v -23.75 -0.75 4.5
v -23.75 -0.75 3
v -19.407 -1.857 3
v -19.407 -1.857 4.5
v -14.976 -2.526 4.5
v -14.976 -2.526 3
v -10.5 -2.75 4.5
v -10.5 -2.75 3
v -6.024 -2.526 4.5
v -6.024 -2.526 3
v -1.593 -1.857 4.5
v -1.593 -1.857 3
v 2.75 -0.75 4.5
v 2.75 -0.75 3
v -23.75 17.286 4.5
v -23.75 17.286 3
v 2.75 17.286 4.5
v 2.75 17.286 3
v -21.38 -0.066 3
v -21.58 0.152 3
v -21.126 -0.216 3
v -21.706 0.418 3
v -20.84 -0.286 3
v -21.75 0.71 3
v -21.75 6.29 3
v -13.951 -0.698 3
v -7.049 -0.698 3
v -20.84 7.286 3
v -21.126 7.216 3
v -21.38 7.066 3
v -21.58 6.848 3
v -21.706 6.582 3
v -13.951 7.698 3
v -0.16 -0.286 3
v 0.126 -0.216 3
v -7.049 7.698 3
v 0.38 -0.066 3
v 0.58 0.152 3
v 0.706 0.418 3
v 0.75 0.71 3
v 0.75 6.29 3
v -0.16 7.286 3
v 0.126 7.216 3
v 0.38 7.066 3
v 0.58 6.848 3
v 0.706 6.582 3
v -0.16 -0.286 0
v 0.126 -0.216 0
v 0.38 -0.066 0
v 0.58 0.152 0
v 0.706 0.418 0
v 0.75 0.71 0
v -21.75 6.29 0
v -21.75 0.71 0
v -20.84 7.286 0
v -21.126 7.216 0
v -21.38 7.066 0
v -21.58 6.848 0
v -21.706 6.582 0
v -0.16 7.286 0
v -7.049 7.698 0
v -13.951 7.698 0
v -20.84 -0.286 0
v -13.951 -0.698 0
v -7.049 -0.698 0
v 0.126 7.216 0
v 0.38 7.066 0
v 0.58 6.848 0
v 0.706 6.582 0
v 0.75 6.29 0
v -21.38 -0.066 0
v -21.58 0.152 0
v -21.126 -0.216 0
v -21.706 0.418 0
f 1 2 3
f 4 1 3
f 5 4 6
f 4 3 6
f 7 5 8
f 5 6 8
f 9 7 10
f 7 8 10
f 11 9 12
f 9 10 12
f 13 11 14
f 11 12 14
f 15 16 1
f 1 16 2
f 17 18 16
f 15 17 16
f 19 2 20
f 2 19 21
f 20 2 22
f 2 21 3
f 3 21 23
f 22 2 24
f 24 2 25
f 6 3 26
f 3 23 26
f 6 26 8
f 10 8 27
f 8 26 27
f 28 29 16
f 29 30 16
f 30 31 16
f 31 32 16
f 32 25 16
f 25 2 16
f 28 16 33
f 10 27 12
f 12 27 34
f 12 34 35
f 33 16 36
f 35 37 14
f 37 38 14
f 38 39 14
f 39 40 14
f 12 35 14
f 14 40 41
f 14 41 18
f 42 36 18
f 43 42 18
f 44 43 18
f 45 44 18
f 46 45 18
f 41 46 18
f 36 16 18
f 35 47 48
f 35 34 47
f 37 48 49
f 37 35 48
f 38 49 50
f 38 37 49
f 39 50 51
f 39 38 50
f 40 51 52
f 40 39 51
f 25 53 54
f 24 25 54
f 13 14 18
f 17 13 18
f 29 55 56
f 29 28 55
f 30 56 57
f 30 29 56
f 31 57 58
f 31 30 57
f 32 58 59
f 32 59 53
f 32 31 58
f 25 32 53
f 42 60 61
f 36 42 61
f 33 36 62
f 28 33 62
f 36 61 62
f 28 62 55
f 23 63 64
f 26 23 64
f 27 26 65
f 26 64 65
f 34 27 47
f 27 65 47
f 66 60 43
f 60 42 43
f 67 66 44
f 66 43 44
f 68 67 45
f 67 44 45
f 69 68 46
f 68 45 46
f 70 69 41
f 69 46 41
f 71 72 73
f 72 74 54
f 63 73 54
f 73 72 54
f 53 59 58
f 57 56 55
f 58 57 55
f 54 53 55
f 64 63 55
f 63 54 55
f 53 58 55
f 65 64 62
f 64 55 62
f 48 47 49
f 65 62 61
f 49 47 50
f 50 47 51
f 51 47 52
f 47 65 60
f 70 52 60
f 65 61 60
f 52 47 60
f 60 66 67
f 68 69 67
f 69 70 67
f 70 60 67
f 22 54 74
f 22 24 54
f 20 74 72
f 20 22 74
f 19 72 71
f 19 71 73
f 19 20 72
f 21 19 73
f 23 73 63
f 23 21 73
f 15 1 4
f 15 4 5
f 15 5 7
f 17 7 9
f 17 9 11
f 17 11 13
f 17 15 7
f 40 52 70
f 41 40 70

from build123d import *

# Parameters (mm, degrees)
F1_DEPTH = 3
F2_R     = 1
F4_DEPTH = 1.5


with BuildPart() as f1:
    # F0 (on Top) → F1 (new body)
    with BuildSketch(Plane.XY):
        with BuildLine():
            ThreePointArc((0.75, 7.2), (-10.5, 7.75), (-21.75, 7.2))
            Line((-21.75, 7.2), (-21.75, -0.2))
            ThreePointArc((-21.75, -0.2), (-10.5, -0.75), (0.75, -0.2))
            Line((0.75, -0.2), (0.75, 7.2))
        make_face()
    extrude(amount=F1_DEPTH)

    # F2
    f2_edges = [f1.edges().sort_by_distance(p)[0] for p in [
        (-21.75, 7.2, 1.5),
        (-21.75, -0.2, 1.5),
        (0.75, -0.2, 1.5),
        (0.75, 7.2, 1.5),
    ]]
    fillet(f2_edges, radius=F2_R)

    # F3 (on face) → F4 (join)
    with BuildSketch(Plane.XY.offset(3)):
        with BuildLine():
            Line((2.75, 17.285583), (-23.75, 17.285583))
            Line((-23.75, 17.285583), (-23.75, -0.75))
            ThreePointArc((-23.75, -0.75), (-10.5, -2.75), (2.75, -0.75))
            Line((2.75, -0.75), (2.75, 17.285583))
        make_face()
    extrude(amount=F4_DEPTH)


solid = f1.part
